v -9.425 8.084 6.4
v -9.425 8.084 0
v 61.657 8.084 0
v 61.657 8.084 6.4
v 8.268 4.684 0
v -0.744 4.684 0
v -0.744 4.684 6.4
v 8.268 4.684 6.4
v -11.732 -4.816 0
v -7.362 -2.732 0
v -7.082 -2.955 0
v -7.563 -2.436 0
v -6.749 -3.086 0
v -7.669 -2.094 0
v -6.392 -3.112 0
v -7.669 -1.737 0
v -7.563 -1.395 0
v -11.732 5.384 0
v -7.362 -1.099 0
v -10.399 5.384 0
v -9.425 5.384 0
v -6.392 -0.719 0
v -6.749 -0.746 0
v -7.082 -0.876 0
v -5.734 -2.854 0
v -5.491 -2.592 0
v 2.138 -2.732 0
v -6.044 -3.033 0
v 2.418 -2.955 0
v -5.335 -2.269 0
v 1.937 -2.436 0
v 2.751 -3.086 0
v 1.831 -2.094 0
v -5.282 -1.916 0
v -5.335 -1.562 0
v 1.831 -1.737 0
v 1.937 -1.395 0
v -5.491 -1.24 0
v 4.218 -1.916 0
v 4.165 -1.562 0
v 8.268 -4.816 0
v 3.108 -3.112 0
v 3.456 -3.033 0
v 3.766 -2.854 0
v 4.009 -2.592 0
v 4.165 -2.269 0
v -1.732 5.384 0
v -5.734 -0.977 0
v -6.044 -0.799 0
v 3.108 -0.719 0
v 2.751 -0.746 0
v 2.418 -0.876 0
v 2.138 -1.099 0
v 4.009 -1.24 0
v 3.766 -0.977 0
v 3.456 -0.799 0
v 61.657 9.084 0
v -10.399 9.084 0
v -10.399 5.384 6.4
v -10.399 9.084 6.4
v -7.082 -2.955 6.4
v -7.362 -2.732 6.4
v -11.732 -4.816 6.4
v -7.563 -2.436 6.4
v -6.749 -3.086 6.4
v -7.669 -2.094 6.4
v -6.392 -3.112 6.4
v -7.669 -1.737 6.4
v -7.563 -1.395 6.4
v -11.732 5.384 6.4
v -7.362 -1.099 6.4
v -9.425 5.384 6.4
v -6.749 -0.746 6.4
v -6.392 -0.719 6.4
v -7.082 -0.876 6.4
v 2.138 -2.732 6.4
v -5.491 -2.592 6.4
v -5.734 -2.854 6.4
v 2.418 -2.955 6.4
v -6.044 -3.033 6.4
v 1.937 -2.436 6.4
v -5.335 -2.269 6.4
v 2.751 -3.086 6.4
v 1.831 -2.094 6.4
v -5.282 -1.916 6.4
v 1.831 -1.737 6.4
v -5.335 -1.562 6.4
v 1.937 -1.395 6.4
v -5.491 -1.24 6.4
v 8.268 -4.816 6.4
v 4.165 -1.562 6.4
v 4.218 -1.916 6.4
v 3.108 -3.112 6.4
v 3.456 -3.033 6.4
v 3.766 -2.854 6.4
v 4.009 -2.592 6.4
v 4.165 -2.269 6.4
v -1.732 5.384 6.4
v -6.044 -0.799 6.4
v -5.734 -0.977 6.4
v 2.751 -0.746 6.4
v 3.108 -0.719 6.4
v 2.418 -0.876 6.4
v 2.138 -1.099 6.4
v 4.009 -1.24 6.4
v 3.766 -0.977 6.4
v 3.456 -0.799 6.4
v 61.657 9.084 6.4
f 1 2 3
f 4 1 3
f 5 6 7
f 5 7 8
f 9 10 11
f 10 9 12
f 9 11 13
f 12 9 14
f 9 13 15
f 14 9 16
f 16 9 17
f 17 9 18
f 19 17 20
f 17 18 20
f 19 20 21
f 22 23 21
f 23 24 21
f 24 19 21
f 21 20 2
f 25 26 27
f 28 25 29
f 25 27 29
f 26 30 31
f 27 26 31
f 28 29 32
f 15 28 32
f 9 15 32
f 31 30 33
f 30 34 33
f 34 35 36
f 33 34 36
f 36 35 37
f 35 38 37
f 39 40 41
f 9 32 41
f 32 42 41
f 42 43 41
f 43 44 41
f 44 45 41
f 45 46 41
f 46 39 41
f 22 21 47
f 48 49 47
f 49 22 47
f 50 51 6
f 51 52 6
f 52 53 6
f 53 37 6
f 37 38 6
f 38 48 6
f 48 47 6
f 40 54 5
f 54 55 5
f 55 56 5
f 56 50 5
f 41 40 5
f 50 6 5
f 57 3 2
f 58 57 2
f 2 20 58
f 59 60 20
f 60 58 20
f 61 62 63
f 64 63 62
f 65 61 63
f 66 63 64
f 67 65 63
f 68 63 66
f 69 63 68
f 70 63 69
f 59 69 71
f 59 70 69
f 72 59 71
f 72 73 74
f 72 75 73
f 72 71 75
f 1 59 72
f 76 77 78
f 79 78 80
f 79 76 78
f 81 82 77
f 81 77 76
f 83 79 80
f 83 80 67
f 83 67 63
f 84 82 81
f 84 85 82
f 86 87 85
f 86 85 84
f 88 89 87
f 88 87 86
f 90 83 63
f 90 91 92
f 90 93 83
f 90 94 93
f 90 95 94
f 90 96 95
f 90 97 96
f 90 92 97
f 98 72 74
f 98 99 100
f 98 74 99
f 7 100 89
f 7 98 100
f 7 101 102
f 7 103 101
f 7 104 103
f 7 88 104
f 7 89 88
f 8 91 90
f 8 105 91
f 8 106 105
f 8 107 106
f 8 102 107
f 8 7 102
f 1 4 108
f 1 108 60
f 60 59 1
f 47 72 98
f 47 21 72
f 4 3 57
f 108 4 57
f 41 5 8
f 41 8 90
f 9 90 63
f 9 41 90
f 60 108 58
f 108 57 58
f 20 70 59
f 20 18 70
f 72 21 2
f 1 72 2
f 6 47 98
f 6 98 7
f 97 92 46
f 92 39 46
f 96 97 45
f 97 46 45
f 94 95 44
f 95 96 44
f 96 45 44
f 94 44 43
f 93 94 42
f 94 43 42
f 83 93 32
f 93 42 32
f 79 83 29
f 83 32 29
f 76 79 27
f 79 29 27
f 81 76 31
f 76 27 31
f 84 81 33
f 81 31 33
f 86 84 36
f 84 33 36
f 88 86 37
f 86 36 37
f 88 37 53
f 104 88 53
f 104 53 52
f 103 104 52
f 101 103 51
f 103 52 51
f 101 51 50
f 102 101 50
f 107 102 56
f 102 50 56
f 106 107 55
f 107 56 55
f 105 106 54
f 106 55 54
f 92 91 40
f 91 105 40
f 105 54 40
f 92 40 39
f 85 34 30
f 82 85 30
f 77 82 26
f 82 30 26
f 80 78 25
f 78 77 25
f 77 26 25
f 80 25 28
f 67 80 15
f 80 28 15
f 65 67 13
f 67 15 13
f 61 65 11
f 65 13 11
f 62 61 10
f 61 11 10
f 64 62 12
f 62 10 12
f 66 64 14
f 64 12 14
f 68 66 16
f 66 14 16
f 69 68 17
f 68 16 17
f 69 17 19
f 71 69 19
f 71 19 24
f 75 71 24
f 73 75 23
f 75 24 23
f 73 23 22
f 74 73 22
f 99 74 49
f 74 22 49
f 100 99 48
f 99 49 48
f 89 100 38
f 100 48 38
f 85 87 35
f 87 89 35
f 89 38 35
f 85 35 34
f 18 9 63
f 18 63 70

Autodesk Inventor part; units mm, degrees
ref_plane "YZ Plane" through (0, 0, 0) normal (1, 0, 0) x (0, 1, 0)
ref_plane "XZ Plane" through (0, 0, 0) normal (0, 1, 0) x (-1, 0, 0)
ref_plane "XY Plane" through (0, 0, 0) normal (0, 0, 1) x (1, 0, 0)
sketch "Sketch1" plane through (0, 0, 0) normal (0, 0, 1) x (1, 0, 0)
  line L0 (8.268, 4.6844) -> (8.268, -4.8156)
  line L1 (8.268, -4.8156) -> (-11.732, -4.8156)
  line L2 (-11.732, -4.8156) -> (-11.732, 5.3844)
  circle A0 centre (-6.482, -1.9156) radius 1.2
  circle A1 centre (3.018, -1.9156) radius 1.2
  line L3 (-9.425, 5.3844) -> (-9.425, 8.0844)
  line L4 (-9.425, 8.0844) -> (61.6567, 8.0844)
  line L5 (61.6567, 8.0844) -> (61.6567, 9.0844)
  line L6 (61.6567, 9.0844) -> (-10.3988, 9.0844)
  line L7 (-10.3988, 9.0844) -> (-10.3988, 5.3844)
  line L8 (-1.732, 5.3844) -> (-0.7437, 4.6844)
  line L9 (-0.7437, 4.6844) -> (8.268, 4.6844)
  line L10 (-11.732, 5.3844) -> (-10.3988, 5.3844)
  line L11 (-9.425, 5.3844) -> (-1.732, 5.3844)
  point P0 (0, 0)
  dimension "d0" = 20
  dimension "d2" = 2.4
  dimension "d3" = 2.4
  dimension "d4" = 9.5
  dimension "d5" = 5.25
  dimension "d6" = 2.9
  dimension "d7" = 2.9
  dimension "d8" = 10
  dimension "d9" = 11
  dimension "d10" = 9.5
extrude "Extrusion1" add sketch "Sketch1" along normal blind 6.4
equation "\"d3\" = d2"
equation "\"d7\" = d6"
properties part number "switch"
